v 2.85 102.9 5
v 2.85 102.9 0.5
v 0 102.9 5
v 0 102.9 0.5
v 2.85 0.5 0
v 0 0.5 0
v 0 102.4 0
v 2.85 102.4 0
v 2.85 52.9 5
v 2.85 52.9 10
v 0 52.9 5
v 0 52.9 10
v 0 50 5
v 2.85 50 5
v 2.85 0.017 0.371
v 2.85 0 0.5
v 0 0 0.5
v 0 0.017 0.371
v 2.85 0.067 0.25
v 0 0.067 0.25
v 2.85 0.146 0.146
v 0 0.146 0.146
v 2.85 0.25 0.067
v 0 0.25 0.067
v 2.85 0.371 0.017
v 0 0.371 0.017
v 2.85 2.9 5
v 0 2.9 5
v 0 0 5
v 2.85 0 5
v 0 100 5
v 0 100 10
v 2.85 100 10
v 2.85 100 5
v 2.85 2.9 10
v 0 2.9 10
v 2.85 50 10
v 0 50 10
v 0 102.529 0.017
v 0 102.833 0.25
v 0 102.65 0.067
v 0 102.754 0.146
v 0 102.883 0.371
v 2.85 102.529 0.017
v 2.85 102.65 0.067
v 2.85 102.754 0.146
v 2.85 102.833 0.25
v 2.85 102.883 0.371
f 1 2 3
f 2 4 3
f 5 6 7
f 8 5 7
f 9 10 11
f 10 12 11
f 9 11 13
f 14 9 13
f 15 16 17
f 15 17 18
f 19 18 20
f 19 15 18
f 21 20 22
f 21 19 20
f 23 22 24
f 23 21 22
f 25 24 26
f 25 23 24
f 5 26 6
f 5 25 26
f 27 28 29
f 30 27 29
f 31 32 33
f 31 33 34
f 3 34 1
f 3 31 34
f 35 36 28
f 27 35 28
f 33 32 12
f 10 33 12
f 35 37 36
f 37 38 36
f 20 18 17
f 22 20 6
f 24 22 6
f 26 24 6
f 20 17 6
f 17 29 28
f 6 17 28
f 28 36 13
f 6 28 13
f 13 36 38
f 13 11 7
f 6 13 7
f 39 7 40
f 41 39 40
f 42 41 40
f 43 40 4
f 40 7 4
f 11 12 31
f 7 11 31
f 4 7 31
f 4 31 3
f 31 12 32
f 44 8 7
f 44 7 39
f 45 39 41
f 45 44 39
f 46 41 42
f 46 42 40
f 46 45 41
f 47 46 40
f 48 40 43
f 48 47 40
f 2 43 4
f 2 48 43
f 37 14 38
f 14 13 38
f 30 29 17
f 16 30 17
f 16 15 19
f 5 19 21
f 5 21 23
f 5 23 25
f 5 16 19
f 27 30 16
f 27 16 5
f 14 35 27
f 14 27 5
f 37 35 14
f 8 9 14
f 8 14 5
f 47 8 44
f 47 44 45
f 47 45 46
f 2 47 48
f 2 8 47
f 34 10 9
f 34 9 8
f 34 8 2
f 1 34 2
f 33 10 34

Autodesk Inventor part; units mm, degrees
ref_plane "YZ Plane" through (0, 0, 0) normal (1, 0, 0) x (0, 1, 0)
ref_plane "XZ Plane" through (0, 0, 0) normal (0, 1, 0) x (-1, 0, 0)
ref_plane "XY Plane" through (0, 0, 0) normal (0, 0, 1) x (1, 0, 0)
sketch "Sketch1" plane through (0, 0, 0) normal (1, 0, 0) x (0, 1, 0)
  line L0 (0, 0) -> (102.9, 0)
  line L1 (102.9, 0) -> (102.9, 10)
  line L2 (102.9, 10) -> (0, 10)
  line L3 (0, 10) -> (0, 0)
  line L4 (50, 10) -> (52.9, 10)
  line L5 (52.9, 10) -> (52.9, 5)
  line L6 (52.9, 5) -> (50, 5)
  line L7 (50, 5) -> (50, 10)
  line L8 (102.9, 10) -> (100, 10)
  line L9 (100, 10) -> (100, 5)
  line L10 (100, 5) -> (102.9, 5)
  line L11 (102.9, 5) -> (102.9, 10)
  line L12 (2.9, 5) -> (0, 5)
  line L13 (0, 5) -> (0, 10)
  line L14 (0, 10) -> (2.9, 10)
  line L15 (2.9, 10) -> (2.9, 5)
  line L16 (51.45, 5) -> (51.45, 0)
  point P0 (51.45, 10)
  dimension "d0" = 2.9
  dimension "d1" = 5
  dimension "d2" = 10
  dimension "d3" = 50
extrude "Extrusion1" add sketch "Sketch1" along normal blind 2.85 contours L3 L12 L15 L2 L7 L6 L16 L0 | L16 L6 L5 L2 L9 L10 L1 L0
fillet "Fillet1" radius 0.5 2 edges at (1.425, 0, 0) (1.425, 102.9, 0)
properties part number "comb_spacer"
